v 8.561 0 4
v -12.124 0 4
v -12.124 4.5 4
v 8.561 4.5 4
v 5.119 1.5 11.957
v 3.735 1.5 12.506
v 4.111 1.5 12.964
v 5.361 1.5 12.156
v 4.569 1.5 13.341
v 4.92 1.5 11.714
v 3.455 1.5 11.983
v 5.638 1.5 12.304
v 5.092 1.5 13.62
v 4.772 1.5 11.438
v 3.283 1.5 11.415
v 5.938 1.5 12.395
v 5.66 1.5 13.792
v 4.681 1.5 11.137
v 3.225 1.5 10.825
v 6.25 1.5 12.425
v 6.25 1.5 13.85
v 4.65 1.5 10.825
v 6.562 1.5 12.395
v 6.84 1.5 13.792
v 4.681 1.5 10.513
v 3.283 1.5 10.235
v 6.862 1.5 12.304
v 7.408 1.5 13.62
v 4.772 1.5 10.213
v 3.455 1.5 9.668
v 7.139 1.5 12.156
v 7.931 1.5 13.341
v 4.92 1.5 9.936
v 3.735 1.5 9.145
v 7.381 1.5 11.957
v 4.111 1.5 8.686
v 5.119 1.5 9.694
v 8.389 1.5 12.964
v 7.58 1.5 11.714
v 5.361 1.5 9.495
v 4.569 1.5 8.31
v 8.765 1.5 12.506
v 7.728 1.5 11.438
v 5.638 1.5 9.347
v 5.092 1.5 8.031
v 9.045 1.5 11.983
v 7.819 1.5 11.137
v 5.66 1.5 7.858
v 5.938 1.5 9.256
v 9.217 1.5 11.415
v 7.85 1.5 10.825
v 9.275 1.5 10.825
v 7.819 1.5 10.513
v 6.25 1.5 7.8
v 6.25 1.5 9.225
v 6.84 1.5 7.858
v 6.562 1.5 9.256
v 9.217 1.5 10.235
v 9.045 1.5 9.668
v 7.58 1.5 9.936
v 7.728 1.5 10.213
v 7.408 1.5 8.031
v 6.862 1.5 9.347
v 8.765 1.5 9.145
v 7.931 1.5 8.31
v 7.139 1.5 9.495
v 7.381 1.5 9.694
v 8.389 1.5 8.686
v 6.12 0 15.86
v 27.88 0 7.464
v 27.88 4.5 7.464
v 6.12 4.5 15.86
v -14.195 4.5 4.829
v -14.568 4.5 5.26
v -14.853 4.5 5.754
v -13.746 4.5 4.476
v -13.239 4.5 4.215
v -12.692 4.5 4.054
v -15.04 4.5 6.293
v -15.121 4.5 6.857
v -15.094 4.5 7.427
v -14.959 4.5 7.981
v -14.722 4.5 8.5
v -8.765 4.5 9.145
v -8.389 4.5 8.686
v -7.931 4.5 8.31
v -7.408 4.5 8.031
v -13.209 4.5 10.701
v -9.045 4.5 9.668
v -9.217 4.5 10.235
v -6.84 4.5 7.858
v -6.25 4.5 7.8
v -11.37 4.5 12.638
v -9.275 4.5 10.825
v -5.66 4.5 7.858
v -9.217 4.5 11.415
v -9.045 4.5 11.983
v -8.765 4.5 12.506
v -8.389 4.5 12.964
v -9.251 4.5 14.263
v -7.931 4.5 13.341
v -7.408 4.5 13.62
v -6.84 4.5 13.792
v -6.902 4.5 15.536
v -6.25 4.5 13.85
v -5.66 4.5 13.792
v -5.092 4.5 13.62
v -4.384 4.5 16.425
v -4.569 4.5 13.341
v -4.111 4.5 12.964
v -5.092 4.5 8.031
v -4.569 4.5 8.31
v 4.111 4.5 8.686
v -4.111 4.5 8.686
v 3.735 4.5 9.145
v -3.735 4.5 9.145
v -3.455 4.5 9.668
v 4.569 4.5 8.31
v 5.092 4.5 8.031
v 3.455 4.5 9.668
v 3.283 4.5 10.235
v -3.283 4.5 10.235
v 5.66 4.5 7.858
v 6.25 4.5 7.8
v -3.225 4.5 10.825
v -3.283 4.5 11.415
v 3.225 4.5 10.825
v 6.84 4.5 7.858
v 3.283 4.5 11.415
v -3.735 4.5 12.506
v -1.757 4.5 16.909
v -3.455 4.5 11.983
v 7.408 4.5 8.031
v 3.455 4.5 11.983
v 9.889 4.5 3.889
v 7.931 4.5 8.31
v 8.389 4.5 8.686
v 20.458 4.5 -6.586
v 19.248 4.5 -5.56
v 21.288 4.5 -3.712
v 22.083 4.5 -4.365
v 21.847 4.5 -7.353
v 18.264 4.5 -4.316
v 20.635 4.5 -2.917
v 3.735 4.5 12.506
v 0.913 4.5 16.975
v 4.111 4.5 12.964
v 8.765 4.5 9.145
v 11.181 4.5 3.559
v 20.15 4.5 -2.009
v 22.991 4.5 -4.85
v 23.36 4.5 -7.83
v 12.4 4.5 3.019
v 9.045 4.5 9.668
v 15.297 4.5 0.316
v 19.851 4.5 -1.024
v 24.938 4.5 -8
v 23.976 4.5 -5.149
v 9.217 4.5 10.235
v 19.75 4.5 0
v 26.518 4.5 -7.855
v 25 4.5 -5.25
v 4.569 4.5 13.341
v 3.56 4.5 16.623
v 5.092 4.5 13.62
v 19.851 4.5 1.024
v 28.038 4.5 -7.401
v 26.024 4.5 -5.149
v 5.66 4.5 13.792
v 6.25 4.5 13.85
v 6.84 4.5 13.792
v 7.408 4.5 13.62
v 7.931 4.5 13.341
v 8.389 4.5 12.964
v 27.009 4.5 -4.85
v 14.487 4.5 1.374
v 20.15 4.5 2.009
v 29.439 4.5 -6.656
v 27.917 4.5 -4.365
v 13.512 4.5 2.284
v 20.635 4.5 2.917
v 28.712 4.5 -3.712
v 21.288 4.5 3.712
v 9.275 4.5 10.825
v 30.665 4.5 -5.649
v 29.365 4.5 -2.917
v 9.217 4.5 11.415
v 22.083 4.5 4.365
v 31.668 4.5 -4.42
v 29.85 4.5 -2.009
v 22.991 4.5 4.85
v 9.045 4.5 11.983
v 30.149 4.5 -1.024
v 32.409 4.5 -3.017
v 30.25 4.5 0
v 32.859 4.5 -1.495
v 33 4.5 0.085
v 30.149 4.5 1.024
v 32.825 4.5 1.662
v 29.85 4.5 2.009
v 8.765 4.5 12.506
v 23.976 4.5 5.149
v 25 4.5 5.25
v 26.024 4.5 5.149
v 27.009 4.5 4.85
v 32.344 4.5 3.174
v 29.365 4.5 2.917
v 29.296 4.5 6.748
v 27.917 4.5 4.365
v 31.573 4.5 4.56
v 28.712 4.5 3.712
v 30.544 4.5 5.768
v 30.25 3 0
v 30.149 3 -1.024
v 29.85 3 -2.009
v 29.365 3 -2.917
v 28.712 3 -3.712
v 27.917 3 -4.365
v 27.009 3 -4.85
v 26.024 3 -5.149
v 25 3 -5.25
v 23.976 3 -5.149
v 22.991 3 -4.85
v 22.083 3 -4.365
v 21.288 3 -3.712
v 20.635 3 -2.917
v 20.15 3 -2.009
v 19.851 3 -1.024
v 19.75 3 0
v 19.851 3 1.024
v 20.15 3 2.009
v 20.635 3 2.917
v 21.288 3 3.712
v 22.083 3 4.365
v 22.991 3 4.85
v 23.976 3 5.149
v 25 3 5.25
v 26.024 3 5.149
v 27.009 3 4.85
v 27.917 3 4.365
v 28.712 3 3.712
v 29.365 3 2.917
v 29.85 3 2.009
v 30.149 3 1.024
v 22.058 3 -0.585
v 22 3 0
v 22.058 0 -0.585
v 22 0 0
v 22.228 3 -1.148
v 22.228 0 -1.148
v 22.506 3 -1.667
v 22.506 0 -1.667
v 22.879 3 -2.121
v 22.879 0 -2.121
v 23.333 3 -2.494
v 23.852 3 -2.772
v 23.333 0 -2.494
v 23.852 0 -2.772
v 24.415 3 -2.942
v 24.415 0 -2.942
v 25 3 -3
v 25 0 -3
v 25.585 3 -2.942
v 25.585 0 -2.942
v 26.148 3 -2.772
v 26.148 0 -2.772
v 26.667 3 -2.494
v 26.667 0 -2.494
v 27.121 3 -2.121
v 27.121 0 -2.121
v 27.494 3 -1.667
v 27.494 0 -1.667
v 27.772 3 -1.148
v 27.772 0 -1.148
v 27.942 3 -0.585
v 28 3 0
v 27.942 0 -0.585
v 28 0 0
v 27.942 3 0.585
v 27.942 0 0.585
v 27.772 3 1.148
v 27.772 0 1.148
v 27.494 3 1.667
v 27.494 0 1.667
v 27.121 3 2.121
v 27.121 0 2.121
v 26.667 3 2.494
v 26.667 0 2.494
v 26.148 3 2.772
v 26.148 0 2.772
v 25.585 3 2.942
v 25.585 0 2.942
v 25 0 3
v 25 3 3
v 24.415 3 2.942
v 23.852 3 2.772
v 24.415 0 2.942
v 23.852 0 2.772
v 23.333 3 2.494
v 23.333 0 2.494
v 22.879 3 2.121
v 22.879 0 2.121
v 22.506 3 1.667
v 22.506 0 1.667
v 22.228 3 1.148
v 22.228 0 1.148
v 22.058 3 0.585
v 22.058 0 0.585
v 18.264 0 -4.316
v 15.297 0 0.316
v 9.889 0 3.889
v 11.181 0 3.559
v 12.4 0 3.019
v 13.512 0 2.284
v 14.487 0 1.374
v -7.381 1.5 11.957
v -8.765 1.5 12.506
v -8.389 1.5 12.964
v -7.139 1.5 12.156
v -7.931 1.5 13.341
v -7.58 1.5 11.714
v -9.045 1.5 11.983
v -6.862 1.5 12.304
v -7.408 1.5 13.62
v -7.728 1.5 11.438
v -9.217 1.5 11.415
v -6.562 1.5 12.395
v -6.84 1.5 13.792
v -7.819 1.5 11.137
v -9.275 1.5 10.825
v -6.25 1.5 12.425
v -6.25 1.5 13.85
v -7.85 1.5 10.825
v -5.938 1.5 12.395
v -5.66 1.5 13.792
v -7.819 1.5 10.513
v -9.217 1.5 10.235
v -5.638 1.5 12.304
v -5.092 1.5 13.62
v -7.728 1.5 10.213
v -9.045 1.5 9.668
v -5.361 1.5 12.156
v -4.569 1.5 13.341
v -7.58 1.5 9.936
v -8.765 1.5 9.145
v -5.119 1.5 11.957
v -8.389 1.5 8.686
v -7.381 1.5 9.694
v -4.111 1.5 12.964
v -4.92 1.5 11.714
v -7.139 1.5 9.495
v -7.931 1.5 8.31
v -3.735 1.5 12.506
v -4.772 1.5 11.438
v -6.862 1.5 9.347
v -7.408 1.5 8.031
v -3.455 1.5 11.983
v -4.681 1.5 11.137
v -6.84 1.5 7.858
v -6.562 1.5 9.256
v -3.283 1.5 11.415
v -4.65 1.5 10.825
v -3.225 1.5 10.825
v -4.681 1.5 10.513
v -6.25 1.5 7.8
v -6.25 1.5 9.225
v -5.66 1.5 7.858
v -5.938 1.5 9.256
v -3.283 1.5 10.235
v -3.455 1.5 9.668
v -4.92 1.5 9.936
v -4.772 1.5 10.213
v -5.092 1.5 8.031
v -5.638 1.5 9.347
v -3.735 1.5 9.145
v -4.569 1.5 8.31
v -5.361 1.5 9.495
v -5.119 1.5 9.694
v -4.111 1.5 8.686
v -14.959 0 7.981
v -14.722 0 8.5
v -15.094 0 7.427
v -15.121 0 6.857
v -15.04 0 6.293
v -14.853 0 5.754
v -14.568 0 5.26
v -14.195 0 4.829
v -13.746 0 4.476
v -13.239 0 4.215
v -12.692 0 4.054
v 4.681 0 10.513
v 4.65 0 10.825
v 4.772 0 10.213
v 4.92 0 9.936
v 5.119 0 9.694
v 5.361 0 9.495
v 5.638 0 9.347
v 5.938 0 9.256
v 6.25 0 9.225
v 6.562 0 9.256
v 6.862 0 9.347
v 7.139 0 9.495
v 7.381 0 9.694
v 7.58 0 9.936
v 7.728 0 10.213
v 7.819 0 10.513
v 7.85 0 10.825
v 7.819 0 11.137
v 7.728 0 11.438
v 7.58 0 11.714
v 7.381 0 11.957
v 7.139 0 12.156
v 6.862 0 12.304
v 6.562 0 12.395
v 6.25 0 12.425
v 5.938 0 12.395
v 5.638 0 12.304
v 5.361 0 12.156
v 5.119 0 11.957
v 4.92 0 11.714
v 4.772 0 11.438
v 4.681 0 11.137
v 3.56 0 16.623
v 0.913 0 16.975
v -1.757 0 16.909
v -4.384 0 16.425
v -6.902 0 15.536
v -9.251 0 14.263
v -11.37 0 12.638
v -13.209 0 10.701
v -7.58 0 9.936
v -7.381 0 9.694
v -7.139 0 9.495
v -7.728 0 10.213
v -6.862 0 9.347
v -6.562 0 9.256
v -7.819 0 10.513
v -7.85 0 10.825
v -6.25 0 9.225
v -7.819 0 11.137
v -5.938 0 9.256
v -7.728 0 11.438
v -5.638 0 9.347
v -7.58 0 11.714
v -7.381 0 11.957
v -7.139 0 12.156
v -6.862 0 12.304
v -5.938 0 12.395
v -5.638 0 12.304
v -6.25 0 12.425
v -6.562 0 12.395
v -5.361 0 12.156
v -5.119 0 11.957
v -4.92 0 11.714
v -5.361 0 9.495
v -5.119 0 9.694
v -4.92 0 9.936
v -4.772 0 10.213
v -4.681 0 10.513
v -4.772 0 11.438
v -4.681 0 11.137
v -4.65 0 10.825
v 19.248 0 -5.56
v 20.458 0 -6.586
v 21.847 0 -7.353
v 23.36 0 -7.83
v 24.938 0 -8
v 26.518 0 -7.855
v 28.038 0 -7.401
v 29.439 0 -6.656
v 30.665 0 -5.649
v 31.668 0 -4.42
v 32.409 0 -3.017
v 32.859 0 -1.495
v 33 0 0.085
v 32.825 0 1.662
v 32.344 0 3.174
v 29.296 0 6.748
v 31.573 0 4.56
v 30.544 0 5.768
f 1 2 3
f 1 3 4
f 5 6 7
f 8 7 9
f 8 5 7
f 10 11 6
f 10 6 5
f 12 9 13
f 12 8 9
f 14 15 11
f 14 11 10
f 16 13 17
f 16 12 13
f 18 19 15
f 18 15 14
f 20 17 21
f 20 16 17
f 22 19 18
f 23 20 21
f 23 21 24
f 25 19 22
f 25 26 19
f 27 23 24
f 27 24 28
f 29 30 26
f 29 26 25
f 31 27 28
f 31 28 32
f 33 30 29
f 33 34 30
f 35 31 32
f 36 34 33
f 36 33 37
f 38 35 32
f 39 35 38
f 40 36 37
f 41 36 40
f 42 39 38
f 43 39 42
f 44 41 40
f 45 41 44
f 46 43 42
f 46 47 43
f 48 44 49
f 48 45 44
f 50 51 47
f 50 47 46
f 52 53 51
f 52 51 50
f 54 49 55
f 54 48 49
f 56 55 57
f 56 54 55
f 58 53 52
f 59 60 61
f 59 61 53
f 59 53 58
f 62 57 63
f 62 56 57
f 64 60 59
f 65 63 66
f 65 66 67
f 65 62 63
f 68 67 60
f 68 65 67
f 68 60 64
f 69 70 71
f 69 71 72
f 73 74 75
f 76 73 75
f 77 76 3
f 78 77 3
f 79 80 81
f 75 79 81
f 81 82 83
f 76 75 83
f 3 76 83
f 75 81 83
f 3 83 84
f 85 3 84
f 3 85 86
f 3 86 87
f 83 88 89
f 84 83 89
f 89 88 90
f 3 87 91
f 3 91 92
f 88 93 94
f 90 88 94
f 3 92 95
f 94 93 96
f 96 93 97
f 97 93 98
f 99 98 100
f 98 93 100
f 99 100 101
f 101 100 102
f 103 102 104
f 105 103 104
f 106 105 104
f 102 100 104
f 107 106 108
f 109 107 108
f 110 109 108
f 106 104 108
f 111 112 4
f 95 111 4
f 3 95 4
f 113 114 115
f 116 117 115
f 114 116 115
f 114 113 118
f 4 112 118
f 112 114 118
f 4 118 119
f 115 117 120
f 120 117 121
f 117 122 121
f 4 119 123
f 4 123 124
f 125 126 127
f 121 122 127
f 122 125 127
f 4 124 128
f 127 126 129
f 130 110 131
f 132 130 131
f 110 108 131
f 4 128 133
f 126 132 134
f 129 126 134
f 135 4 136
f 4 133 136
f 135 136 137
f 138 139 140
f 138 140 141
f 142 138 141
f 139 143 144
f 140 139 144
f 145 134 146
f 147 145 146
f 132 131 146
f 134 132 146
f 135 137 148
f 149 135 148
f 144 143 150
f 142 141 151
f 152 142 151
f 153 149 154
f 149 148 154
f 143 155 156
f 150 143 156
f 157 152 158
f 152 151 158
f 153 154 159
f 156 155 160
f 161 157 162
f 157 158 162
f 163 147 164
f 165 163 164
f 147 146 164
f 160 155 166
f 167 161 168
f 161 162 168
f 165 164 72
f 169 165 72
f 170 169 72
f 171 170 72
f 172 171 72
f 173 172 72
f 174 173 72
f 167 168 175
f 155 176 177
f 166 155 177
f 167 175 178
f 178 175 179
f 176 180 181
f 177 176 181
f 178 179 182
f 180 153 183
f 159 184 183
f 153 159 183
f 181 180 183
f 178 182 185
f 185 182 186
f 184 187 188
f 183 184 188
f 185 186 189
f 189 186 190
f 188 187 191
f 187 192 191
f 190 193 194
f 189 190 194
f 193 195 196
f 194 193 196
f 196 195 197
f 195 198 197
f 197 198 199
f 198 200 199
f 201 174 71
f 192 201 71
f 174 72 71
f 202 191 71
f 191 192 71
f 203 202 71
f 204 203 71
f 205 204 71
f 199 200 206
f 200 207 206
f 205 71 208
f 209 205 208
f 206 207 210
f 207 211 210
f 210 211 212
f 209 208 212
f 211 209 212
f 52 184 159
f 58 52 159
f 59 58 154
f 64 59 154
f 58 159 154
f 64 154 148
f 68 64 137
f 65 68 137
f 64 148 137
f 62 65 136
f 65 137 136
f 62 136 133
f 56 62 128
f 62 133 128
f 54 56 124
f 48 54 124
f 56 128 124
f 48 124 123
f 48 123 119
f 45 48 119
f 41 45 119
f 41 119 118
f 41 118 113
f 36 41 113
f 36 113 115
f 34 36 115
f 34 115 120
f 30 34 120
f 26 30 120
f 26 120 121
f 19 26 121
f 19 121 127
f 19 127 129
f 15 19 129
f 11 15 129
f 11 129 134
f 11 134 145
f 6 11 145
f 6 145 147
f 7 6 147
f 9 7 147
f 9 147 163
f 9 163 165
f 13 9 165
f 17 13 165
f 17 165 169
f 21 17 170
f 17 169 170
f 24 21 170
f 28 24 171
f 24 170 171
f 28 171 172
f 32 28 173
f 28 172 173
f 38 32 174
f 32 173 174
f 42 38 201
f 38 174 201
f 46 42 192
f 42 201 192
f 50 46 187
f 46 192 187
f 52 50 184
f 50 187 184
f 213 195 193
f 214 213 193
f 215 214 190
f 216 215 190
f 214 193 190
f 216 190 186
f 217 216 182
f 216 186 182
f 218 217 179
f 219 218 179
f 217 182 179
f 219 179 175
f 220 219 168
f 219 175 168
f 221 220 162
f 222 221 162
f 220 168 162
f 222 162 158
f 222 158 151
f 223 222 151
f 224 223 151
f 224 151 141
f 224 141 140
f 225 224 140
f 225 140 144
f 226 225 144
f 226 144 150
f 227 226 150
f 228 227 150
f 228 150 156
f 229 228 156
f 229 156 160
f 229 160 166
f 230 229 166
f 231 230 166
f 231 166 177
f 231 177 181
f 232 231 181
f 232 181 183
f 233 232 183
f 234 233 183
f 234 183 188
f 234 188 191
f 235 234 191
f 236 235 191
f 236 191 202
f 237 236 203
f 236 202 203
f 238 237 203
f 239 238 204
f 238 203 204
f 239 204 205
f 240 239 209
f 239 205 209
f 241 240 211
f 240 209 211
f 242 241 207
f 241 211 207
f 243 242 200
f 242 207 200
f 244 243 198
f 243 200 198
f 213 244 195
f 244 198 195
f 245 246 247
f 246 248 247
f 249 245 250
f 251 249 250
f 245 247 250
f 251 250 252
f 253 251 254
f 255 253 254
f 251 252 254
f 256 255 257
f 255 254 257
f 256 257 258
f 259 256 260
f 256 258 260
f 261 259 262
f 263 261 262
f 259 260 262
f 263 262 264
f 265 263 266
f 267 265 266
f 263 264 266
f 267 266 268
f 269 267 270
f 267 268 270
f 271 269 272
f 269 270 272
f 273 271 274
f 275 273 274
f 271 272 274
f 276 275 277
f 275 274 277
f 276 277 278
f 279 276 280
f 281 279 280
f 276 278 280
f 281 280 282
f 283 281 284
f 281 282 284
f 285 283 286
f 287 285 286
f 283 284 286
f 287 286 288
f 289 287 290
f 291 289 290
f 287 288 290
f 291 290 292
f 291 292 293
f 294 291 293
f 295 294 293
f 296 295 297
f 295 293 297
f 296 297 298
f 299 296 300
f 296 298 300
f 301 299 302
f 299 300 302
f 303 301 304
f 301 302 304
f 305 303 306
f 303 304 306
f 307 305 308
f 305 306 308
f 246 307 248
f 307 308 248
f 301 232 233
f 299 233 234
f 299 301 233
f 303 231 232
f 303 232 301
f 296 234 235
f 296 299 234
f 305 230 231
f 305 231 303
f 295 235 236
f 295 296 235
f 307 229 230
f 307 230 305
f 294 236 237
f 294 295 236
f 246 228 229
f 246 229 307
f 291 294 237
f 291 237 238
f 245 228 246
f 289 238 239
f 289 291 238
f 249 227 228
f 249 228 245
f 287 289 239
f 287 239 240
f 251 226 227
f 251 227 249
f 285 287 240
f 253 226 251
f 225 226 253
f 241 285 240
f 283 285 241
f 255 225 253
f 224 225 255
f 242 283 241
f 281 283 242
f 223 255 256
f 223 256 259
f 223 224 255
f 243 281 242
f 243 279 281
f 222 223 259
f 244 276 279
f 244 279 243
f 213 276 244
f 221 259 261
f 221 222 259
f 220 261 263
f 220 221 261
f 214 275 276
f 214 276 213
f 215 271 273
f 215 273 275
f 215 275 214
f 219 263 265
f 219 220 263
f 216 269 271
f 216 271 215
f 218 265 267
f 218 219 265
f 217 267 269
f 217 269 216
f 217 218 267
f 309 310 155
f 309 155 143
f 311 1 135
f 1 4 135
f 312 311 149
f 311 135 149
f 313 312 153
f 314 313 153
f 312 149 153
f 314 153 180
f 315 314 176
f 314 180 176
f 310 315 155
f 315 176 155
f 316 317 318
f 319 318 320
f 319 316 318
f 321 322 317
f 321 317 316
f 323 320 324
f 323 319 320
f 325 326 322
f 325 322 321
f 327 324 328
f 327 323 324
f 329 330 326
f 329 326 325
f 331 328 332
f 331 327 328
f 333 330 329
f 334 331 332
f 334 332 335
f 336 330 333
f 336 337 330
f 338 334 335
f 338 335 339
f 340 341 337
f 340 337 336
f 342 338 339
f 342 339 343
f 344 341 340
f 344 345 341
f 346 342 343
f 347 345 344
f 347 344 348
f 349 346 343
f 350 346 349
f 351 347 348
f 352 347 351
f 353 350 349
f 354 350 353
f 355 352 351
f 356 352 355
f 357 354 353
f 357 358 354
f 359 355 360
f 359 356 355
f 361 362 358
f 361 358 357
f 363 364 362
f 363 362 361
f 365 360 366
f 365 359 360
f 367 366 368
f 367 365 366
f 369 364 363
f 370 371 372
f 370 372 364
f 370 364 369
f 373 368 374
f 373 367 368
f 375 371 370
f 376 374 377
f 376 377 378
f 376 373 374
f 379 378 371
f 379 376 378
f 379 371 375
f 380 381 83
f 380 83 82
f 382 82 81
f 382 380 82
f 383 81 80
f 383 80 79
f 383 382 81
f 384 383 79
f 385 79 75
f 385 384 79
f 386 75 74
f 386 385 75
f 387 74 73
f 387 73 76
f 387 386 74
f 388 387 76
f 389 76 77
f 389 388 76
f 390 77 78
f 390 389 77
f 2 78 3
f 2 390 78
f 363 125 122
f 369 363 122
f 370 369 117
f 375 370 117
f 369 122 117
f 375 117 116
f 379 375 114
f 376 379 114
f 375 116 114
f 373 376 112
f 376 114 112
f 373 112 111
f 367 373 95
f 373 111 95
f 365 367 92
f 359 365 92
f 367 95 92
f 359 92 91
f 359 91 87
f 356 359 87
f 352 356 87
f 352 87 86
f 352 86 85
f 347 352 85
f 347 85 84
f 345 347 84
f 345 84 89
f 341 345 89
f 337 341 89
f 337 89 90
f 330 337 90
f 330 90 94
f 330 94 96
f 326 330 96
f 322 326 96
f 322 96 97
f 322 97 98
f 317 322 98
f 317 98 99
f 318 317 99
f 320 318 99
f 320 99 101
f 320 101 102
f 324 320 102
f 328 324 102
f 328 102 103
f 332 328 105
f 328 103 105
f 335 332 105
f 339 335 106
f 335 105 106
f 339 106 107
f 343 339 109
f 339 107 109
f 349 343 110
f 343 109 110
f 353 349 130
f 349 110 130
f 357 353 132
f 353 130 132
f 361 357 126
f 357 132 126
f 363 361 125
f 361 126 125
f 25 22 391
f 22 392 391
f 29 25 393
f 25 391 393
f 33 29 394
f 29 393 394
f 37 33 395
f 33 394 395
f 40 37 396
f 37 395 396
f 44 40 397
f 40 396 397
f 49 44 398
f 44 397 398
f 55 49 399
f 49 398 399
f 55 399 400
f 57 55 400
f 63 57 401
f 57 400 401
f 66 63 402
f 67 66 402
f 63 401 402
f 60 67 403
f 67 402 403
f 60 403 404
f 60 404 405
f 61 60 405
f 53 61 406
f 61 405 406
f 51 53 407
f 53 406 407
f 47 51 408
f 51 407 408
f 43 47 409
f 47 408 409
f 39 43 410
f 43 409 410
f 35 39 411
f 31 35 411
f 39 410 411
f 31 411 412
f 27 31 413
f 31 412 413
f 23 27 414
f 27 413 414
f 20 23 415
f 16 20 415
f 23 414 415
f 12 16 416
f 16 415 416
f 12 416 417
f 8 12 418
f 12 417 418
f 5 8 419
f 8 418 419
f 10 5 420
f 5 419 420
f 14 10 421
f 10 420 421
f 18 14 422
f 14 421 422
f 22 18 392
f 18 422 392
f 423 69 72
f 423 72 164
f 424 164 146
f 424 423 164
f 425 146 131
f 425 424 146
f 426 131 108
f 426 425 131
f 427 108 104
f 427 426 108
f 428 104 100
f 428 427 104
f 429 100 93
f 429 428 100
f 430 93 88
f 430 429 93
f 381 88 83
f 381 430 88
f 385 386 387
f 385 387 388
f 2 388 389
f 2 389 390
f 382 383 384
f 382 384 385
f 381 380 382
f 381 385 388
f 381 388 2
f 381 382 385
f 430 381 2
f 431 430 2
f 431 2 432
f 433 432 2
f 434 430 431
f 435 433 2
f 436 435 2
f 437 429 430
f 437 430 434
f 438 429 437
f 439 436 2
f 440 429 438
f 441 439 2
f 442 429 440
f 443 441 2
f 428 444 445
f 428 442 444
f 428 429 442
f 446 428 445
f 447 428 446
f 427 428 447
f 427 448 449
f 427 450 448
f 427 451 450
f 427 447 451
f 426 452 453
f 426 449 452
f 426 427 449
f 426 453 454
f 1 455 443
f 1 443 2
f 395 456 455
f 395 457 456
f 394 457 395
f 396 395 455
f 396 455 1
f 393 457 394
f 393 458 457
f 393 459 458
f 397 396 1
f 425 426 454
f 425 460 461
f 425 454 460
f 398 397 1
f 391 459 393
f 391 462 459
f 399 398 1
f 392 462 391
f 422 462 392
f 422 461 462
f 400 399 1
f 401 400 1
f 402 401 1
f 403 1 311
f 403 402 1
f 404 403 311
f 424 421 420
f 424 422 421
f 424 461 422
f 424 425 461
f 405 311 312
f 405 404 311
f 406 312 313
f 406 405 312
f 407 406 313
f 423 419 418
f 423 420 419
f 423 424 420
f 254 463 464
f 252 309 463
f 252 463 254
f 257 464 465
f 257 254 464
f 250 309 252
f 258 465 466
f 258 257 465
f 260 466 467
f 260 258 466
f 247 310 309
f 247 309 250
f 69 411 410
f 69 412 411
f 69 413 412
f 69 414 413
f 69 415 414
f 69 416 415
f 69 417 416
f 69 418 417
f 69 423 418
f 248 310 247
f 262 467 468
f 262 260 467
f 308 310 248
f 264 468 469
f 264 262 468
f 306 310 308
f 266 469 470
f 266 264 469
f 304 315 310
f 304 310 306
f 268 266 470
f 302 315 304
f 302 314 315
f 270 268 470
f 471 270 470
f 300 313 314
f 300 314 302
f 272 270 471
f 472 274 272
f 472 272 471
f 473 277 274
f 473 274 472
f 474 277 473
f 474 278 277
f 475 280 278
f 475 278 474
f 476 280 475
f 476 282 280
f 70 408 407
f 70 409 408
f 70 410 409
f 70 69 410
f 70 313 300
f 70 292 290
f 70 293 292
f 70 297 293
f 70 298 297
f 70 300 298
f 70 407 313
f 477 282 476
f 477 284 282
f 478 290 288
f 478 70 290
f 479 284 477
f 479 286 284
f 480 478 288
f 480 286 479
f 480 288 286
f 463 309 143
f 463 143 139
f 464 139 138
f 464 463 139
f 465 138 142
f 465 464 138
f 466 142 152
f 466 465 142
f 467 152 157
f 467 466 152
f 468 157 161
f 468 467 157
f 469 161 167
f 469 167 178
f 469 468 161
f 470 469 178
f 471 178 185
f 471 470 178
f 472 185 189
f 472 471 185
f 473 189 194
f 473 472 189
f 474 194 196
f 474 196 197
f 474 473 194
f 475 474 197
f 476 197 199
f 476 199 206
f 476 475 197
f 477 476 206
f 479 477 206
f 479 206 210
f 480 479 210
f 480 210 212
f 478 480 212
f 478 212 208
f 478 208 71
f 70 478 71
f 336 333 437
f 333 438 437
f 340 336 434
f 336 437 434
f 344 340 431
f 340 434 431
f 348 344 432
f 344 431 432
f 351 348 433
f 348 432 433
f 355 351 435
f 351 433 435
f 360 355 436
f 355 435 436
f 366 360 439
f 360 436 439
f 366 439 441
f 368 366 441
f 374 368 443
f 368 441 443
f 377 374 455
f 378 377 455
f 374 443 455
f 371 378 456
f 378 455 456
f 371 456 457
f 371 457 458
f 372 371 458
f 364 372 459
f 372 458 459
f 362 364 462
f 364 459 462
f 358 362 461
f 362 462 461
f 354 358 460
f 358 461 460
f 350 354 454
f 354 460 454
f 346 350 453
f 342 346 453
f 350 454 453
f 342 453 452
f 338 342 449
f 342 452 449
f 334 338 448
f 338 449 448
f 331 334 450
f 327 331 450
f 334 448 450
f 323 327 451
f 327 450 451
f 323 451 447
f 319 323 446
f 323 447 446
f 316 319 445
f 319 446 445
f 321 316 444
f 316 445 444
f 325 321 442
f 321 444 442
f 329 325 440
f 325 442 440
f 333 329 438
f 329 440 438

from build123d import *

# Parameters (mm, degrees)
EXTRUDE_1_DEPTH             = 4.5
HOLE_WIZARD_M31_D           = 3.2
HOLE_WIZARD_M31_CBORE_D     = 6.05
HOLE_WIZARD_M31_CBORE_DEPTH = 3
HOLE_WIZARD_1_D             = 6
HOLE_WIZARD_1_CBORE_D       = 10.5
HOLE_WIZARD_1_CBORE_DEPTH   = 1.5
FILLET_1_R                  = 8


with BuildPart() as part:
    # Эскиз1 → Бобышка-Вытянуть1 (new body)
    with BuildSketch(Plane.XZ):
        with BuildLine():
            Line((-12.124355653, 4), (12.936430666, 4))
            Line((12.936430666, 4), (18.263831879, -4.315557791))
            ThreePointArc((18.263831879, -4.315557791), (31.197157109, -5.059174218), (27.88, 7.463618425))
            Line((27.88, 7.463618425), (6.12, 15.860189154))
            ThreePointArc((6.12, 15.860189154), (-5.660702659, 16.029861054), (-14.722431864, 8.5))
            ThreePointArc((-14.722431864, 8.5), (-14.722431864, 5.5), (-12.124355653, 4))
        make_face()
    extrude(amount=-EXTRUDE_1_DEPTH)

    # Цековка для винта с заклепочной головкой M31 (through all)
    with Locations(Plane(origin=(0, 4.5, 0), x_dir=(1, 0, 0), z_dir=(0, 1, 0))):
        with Locations((-6.25, -10.825317547), (6.25, -10.825317547)):
            CounterBoreHole(HOLE_WIZARD_M31_D / 2, HOLE_WIZARD_M31_CBORE_D / 2, HOLE_WIZARD_M31_CBORE_DEPTH)

    # Отверстие1 (through all)
    with Locations(Plane(origin=(0, 4.5, 0), x_dir=(1, 0, 0), z_dir=(0, 1, 0))):
        with Locations((25, 0)):
            CounterBoreHole(HOLE_WIZARD_1_D / 2, HOLE_WIZARD_1_CBORE_D / 2, HOLE_WIZARD_1_CBORE_DEPTH)

    # Скругление1
    fillet_1_edges = [part.edges().sort_by_distance(p)[0] for p in [
        (12.936430666, 2.25, 4),
    ]]
    fillet(fillet_1_edges, radius=FILLET_1_R)


solid = part.part
